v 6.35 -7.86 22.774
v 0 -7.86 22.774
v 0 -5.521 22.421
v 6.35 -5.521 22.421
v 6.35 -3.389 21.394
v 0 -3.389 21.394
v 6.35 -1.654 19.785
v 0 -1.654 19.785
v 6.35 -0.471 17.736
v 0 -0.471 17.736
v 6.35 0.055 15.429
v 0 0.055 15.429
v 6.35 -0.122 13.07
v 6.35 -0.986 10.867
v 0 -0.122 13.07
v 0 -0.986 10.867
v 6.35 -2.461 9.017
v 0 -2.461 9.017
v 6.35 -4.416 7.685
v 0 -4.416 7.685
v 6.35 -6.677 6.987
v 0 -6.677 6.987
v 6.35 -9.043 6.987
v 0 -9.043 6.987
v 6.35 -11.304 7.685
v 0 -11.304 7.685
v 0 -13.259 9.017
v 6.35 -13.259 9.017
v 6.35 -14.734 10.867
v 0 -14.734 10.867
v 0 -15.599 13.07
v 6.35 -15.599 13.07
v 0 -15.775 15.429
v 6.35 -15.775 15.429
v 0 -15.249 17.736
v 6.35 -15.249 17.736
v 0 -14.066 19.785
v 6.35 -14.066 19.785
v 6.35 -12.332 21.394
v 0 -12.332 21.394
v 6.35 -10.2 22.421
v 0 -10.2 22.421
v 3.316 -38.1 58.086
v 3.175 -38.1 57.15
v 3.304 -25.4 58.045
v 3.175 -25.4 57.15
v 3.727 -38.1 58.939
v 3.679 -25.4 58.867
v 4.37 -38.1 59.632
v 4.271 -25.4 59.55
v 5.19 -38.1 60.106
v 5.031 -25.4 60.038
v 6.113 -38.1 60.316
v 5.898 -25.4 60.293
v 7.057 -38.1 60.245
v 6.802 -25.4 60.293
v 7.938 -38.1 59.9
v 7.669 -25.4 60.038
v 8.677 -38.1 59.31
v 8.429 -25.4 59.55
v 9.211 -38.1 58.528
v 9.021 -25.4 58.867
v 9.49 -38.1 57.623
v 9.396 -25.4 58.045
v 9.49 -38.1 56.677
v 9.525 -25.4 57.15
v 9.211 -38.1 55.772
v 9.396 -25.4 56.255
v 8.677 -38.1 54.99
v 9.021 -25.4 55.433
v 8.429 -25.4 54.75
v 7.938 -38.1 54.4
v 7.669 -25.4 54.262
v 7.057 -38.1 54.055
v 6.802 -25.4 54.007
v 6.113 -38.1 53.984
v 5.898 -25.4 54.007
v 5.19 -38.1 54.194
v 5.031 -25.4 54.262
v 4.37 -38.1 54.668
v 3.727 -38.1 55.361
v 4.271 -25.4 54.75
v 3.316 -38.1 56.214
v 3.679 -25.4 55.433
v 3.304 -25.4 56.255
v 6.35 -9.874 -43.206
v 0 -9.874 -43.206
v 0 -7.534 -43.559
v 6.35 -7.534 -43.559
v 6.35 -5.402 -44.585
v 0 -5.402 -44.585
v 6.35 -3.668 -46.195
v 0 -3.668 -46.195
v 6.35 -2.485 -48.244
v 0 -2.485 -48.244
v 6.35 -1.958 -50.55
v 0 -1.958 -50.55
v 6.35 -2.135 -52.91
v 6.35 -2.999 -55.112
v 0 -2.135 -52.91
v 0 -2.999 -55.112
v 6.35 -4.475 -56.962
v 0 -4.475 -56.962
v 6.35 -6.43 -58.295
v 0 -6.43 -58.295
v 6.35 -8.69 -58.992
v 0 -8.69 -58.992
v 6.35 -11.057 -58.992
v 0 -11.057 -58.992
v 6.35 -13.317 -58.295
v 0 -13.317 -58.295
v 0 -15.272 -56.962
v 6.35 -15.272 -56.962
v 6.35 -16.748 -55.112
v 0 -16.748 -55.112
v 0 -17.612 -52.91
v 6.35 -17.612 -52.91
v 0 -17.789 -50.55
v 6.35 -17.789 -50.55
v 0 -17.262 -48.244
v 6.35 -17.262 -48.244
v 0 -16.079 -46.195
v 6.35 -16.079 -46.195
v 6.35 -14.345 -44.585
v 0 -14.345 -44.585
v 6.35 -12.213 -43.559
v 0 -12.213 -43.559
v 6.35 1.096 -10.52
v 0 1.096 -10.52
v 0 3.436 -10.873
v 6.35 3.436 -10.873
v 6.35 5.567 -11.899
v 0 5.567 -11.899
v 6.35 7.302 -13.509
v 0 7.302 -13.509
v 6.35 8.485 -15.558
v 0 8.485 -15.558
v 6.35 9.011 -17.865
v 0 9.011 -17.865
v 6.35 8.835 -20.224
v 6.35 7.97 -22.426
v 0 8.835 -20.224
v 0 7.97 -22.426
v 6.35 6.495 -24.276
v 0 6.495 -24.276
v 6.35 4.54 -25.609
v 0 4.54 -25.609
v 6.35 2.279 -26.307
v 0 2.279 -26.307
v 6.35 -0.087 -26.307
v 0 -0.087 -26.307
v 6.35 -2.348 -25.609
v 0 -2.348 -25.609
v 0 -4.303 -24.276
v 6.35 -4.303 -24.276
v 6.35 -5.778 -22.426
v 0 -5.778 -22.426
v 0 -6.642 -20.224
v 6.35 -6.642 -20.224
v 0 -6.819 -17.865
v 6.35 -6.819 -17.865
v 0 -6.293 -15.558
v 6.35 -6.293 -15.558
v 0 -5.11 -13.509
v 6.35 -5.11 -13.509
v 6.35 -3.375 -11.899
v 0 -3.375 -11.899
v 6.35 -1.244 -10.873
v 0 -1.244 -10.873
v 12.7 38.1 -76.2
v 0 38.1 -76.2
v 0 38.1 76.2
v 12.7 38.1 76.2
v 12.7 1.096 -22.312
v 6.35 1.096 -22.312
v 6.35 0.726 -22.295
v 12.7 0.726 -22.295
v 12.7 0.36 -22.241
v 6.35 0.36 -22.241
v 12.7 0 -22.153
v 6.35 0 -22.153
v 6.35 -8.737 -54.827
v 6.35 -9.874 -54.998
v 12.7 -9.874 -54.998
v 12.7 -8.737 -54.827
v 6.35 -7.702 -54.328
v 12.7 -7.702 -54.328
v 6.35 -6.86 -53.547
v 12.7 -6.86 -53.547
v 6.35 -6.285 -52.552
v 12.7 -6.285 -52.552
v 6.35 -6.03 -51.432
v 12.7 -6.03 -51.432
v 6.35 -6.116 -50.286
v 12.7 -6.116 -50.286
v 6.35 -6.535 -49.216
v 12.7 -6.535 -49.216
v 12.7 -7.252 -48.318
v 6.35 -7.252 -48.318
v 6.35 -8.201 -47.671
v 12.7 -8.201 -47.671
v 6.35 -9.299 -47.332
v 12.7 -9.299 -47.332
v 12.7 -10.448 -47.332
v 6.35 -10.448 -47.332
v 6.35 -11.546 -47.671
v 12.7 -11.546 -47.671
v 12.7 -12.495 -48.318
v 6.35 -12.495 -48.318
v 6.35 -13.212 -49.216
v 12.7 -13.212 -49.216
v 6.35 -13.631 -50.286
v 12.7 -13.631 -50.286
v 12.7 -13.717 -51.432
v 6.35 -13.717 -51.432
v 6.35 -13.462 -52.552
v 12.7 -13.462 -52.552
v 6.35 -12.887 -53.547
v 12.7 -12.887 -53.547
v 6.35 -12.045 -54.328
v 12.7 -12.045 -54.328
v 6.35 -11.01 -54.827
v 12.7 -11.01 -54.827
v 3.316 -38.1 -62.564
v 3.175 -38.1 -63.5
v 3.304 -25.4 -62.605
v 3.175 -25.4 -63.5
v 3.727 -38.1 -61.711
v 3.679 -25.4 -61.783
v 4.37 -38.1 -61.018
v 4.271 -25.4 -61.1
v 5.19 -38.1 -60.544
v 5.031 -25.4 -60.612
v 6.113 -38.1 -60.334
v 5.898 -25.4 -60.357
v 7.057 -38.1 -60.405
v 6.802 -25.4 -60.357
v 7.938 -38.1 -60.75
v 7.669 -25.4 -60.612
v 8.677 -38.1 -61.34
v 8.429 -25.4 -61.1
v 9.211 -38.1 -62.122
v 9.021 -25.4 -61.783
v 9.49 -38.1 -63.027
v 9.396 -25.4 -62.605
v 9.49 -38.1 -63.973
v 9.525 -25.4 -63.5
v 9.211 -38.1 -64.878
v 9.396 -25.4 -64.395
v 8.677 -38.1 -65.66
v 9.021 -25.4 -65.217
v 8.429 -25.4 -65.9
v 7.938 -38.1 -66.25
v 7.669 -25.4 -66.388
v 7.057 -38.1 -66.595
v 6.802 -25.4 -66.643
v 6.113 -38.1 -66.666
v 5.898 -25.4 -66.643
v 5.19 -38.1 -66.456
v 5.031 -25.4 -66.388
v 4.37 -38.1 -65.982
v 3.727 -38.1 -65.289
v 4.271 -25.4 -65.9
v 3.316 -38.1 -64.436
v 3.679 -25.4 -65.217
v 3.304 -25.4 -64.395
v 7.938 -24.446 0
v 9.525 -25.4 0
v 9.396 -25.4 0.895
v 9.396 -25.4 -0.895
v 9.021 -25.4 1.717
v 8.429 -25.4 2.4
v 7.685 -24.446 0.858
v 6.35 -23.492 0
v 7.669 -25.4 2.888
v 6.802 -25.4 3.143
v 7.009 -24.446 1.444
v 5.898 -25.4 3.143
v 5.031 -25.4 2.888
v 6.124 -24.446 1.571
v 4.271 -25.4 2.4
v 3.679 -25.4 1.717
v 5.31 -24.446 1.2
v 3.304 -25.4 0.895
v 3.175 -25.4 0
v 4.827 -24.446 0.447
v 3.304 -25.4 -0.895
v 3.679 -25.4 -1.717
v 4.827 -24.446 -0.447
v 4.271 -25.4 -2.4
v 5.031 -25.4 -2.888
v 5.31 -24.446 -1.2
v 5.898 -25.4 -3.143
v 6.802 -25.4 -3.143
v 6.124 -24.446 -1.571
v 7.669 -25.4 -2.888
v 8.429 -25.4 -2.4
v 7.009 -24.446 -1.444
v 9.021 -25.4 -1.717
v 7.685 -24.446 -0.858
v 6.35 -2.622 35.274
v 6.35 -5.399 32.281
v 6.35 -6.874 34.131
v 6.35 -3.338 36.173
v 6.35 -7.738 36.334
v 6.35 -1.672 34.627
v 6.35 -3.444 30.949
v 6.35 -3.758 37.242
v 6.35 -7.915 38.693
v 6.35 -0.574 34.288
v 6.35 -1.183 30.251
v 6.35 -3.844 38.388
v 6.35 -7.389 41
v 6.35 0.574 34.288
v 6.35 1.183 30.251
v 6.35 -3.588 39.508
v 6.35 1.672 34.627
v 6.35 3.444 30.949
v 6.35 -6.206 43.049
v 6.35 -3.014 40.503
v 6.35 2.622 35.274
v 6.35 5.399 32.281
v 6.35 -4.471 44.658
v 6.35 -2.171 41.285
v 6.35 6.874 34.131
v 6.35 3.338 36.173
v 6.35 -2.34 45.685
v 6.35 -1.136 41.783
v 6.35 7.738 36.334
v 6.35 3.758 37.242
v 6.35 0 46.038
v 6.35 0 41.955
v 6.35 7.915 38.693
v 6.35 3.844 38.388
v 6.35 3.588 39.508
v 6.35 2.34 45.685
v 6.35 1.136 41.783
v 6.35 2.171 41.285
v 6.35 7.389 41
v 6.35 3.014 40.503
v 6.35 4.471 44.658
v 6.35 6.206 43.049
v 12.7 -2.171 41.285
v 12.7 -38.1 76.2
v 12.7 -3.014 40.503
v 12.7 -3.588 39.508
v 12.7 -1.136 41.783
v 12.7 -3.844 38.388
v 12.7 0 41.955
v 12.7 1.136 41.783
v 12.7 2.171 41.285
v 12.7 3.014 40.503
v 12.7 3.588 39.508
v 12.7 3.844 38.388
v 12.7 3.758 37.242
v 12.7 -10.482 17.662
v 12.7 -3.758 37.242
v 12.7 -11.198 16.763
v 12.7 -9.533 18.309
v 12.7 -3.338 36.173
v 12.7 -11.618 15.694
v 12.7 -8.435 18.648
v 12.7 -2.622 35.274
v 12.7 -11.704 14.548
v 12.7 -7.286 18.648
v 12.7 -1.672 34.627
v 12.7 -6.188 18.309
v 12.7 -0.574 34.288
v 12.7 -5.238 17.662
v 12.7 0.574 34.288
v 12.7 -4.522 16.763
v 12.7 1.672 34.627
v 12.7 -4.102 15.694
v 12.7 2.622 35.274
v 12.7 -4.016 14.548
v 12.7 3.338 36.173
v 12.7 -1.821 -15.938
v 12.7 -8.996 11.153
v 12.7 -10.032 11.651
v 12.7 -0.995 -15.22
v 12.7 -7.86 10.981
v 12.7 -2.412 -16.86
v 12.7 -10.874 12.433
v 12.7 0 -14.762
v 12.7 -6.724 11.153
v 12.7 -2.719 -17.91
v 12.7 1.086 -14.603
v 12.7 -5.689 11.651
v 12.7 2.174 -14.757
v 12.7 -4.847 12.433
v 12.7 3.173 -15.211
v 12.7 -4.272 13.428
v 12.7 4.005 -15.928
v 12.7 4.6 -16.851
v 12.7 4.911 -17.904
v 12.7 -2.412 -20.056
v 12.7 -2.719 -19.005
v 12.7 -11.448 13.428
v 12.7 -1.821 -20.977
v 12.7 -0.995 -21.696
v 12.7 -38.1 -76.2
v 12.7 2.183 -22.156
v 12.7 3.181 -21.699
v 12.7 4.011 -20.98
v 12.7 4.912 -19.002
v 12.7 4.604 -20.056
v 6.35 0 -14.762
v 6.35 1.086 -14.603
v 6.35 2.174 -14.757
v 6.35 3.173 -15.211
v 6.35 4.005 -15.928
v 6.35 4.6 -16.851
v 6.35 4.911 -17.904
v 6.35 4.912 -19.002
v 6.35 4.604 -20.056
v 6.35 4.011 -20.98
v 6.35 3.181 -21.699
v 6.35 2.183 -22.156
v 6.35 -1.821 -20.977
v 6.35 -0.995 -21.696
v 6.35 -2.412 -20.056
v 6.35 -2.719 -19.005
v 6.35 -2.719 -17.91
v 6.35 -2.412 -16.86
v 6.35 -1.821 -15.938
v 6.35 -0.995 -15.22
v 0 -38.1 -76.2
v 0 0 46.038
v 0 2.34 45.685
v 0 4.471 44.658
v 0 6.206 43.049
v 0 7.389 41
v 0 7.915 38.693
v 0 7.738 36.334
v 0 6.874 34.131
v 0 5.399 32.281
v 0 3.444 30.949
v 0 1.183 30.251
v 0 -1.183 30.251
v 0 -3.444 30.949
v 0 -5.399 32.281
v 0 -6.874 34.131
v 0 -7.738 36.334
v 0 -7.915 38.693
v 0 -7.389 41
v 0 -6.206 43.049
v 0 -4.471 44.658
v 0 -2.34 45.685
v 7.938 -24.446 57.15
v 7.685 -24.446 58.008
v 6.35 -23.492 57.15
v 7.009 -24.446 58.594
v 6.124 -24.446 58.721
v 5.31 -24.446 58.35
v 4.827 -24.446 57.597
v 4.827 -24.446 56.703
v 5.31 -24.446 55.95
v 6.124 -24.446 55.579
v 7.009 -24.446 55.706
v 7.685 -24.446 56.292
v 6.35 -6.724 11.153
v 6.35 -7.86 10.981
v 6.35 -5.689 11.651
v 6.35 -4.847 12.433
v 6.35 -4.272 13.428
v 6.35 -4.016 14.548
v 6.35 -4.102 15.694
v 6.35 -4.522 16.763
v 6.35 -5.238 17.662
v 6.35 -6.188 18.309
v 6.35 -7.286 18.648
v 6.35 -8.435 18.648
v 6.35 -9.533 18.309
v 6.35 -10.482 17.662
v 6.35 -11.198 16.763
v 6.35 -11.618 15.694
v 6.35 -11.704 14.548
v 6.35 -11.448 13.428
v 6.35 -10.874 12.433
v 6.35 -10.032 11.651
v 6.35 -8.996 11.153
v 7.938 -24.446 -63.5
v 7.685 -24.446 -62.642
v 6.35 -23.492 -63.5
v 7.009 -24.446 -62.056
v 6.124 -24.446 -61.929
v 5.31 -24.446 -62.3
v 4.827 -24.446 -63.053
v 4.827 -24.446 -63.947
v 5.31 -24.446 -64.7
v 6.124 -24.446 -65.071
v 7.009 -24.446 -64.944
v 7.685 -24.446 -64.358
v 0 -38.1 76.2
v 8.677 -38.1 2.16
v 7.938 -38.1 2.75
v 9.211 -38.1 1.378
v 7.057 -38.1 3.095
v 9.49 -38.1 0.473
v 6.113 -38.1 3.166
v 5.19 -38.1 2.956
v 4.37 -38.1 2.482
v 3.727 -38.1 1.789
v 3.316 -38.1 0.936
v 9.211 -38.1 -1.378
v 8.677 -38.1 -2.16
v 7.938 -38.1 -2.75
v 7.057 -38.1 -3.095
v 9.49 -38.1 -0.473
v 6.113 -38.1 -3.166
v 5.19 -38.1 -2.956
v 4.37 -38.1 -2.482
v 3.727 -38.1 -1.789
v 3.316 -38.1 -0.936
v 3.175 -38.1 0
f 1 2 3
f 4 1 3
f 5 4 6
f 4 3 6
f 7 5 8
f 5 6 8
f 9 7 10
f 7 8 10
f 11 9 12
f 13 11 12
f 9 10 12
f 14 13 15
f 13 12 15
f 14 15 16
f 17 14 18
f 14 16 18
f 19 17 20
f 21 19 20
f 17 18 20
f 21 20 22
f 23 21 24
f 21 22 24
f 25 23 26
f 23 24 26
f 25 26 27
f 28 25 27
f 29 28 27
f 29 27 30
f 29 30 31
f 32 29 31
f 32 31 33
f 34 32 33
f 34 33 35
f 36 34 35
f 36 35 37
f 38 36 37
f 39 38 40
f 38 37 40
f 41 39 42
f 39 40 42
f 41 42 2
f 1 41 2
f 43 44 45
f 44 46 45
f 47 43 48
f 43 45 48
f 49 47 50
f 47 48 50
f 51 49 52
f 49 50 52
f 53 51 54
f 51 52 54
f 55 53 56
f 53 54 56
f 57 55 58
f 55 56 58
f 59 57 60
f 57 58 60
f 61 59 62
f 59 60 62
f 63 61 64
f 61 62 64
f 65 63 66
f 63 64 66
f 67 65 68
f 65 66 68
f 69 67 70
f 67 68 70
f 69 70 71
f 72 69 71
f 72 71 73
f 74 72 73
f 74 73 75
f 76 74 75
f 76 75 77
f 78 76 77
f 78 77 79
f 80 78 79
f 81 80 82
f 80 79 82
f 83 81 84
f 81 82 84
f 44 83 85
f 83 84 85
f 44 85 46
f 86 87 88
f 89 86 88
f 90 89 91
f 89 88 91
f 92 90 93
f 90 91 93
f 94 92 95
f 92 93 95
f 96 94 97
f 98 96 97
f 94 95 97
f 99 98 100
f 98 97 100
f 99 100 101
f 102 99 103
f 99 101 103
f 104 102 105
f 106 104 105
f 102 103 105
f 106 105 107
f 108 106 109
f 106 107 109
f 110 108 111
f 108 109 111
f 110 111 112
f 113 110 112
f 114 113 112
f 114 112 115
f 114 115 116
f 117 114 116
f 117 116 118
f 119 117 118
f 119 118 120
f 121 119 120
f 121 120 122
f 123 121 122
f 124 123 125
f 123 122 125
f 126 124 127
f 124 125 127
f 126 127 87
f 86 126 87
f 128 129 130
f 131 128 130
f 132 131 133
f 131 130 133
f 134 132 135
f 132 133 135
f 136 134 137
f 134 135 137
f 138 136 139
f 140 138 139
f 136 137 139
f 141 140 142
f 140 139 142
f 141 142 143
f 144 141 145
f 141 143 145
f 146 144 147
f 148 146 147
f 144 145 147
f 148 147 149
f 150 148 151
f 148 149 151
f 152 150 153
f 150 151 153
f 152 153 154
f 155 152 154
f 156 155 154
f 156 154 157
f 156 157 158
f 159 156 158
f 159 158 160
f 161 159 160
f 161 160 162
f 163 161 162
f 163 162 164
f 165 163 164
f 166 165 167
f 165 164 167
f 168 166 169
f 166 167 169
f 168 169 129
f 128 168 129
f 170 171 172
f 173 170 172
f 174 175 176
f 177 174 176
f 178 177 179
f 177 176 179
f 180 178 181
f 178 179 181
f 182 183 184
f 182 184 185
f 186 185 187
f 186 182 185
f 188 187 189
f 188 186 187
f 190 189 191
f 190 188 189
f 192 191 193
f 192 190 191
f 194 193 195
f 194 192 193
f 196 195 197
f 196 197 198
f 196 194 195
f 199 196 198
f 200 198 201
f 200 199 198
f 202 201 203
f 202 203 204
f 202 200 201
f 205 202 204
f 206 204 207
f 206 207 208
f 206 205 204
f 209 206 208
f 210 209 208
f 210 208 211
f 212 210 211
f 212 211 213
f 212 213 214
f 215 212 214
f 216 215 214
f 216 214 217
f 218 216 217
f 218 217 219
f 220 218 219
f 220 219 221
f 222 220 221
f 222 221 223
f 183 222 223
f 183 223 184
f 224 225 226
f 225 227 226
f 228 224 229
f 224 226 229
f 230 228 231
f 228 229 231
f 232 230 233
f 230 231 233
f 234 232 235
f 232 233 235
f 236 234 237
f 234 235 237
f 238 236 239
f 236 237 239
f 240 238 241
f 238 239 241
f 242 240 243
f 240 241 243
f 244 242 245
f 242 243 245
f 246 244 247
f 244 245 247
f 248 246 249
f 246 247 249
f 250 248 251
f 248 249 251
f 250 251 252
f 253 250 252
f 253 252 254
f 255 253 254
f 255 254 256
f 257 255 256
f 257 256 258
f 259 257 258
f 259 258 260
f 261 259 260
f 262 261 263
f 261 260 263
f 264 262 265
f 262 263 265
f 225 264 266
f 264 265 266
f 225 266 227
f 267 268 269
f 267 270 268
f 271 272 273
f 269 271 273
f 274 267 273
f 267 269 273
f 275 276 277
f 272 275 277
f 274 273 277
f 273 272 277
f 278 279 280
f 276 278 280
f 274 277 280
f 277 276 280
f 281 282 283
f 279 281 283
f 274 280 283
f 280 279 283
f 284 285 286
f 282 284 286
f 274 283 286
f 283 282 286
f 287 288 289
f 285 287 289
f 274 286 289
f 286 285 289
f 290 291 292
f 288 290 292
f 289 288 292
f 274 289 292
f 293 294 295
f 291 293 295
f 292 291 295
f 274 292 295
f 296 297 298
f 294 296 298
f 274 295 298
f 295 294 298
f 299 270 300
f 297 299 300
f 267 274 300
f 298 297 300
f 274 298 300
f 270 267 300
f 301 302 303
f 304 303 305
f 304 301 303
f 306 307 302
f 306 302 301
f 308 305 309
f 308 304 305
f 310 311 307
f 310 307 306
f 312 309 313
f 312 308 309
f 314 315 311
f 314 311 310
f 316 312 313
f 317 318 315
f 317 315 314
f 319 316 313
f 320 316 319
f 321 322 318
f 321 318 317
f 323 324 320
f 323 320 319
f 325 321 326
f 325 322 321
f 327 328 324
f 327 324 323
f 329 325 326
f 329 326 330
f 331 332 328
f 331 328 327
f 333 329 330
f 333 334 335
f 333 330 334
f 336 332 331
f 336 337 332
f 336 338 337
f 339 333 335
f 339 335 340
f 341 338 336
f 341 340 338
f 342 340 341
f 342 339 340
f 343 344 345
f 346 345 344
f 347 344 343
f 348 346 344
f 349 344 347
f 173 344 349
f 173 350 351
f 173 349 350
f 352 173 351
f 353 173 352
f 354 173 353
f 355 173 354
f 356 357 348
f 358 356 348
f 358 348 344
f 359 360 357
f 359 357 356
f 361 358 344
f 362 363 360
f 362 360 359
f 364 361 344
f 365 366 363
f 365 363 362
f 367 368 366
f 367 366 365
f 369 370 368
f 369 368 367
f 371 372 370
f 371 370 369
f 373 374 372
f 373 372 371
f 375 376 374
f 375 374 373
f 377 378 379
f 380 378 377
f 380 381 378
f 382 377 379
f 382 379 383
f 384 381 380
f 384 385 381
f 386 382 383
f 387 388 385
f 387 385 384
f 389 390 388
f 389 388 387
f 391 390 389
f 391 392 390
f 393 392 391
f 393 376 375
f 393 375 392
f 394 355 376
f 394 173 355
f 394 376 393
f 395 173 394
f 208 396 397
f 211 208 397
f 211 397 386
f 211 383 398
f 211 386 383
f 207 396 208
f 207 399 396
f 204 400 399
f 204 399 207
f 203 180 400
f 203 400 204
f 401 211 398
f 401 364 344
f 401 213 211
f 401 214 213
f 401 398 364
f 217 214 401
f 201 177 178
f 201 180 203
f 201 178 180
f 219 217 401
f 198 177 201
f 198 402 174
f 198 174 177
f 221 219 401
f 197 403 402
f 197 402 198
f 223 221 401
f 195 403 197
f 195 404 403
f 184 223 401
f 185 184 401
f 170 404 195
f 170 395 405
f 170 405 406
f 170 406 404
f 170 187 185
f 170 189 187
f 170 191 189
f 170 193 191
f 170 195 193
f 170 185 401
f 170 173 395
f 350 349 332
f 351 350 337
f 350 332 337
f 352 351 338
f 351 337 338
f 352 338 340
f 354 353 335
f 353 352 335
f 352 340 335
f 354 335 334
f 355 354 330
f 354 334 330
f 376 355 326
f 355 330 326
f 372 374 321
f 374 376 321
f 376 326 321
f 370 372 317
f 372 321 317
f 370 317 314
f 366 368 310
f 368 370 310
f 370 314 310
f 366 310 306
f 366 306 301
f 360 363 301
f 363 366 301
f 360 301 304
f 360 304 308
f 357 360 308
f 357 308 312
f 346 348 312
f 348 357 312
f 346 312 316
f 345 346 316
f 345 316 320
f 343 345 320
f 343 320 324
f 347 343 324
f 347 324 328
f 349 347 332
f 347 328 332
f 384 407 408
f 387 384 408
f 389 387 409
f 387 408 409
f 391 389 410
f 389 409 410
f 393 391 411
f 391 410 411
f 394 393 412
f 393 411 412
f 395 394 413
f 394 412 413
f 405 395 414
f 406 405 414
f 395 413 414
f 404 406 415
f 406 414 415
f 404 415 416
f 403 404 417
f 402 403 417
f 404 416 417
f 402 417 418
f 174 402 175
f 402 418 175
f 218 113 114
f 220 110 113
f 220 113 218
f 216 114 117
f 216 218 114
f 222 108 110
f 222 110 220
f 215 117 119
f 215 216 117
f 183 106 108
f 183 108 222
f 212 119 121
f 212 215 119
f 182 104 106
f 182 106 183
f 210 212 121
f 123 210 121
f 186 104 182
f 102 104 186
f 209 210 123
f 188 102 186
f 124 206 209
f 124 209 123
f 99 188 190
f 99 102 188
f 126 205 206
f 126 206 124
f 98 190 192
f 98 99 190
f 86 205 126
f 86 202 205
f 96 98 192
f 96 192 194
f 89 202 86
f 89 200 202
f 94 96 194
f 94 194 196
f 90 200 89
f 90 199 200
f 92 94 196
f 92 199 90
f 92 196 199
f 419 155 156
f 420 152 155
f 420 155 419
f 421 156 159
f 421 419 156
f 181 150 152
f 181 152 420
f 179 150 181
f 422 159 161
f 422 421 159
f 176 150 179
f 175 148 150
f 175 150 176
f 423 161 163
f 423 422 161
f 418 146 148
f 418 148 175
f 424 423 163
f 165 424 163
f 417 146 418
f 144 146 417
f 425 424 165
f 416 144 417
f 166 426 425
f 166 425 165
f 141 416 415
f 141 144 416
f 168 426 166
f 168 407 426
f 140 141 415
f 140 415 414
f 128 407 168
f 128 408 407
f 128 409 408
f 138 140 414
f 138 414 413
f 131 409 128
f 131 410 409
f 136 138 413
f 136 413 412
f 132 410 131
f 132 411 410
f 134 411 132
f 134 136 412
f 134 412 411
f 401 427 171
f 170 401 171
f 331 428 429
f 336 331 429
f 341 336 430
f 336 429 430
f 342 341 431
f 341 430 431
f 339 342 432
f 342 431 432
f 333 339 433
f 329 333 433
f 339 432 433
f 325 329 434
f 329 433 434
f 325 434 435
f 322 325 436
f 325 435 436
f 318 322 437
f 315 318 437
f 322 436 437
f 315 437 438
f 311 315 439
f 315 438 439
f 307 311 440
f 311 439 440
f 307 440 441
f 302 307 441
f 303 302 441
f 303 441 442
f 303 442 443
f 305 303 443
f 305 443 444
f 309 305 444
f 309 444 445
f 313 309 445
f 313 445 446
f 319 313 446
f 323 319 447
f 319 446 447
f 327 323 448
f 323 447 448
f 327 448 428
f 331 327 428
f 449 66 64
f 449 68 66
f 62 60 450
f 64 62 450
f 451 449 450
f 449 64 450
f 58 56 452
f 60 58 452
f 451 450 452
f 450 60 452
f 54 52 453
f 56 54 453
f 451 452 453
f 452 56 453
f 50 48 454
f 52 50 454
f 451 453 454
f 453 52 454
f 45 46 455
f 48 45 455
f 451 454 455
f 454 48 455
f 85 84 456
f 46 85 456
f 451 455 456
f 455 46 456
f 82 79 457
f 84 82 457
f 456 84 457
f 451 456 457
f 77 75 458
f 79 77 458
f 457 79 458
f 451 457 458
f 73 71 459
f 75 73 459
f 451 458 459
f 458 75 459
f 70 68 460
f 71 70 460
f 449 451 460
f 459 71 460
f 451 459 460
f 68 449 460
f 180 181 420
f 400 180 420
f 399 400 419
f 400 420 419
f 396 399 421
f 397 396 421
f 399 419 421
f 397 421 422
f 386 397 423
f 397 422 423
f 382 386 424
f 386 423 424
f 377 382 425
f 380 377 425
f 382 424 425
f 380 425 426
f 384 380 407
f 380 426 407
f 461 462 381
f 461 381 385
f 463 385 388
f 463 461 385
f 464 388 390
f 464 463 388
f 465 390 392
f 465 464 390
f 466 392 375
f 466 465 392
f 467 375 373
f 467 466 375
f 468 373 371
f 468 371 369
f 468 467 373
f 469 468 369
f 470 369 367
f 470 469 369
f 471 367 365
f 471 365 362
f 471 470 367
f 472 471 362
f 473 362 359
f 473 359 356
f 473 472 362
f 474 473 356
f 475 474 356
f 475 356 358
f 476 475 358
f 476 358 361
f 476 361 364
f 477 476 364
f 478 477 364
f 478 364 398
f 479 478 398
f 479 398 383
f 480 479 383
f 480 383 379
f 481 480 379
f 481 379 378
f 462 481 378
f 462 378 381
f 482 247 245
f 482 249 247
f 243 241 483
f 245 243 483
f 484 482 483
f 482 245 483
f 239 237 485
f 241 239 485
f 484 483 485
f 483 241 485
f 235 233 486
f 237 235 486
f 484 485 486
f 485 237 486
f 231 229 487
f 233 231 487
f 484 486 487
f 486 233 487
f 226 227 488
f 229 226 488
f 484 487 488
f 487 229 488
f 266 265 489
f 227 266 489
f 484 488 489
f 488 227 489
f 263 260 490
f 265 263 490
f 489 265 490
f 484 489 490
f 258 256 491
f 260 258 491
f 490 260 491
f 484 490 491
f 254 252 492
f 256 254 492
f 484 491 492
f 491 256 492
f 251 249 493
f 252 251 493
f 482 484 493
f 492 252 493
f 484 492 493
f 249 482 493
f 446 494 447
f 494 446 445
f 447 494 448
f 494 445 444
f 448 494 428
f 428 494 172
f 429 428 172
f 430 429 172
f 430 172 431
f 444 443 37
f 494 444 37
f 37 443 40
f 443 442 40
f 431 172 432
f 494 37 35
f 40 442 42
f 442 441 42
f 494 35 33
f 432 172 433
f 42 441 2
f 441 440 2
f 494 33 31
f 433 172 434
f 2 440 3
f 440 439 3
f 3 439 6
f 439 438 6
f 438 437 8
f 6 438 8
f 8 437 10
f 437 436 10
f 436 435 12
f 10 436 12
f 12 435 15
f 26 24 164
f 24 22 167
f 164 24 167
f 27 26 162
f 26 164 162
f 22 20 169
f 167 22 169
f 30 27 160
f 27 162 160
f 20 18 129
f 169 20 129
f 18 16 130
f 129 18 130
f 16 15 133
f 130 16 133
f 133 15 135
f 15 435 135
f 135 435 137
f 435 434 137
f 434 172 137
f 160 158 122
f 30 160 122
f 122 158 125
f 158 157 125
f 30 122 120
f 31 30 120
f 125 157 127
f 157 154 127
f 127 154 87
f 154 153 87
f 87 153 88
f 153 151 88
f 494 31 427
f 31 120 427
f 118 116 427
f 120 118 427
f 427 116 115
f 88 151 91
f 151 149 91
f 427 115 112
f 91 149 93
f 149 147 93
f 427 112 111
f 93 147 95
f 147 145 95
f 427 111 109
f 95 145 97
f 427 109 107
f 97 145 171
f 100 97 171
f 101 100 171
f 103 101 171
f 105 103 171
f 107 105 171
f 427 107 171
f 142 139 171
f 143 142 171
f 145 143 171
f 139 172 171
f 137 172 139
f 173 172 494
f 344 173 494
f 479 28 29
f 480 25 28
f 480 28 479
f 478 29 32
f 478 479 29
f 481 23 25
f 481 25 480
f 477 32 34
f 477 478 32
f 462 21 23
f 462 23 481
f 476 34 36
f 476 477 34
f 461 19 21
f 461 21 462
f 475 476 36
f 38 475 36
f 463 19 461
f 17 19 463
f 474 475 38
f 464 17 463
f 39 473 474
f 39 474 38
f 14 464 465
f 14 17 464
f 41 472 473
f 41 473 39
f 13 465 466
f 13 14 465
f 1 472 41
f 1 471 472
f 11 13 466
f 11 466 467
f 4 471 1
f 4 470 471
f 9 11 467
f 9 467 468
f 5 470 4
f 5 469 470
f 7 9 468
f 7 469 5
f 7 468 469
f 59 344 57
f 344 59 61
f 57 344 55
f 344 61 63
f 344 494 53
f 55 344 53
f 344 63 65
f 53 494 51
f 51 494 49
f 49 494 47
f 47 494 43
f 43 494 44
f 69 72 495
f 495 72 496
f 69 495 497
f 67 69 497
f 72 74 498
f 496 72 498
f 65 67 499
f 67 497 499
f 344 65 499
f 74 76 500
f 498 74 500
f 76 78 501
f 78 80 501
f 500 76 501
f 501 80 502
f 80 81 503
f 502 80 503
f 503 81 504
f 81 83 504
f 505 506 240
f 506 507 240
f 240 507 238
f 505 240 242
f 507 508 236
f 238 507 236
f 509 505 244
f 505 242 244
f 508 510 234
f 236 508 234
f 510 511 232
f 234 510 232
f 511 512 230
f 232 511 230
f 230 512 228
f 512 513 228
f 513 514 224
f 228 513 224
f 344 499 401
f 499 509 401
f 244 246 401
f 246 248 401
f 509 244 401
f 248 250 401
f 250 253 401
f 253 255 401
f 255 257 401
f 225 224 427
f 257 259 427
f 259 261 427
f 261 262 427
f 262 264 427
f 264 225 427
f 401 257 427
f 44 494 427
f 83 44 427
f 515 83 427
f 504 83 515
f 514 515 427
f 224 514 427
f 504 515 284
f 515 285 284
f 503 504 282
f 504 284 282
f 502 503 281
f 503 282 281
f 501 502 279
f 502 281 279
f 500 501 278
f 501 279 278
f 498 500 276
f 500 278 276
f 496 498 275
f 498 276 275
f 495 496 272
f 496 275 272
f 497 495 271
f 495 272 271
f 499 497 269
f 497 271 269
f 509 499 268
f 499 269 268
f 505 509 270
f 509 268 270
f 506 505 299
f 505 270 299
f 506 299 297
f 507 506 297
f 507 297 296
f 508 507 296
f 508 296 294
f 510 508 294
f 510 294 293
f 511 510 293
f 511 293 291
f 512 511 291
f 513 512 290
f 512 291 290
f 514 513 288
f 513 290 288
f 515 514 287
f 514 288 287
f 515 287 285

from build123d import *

# Parameters (mm, degrees)
SKETCH1_W                       = 152.4
SKETCH1_H                       = 76.2
SKETCH1_R                       = 3.854557775
BOSS_EXTRUDE1_DEPTH             = 12.7
F_1_4_0_25_DIAMETER_HOLE2_D     = 6.35
F_1_4_0_25_DIAMETER_HOLE2_DEPTH = 12.7
F_1_4_0_25_DIAMETER_HOLE2_TIP   = 1.907732465
SKETCH2_R                       = 7.9375
CUT_EXTRUDE1_DEPTH              = 6.35


with BuildPart() as part:
    # Sketch1 → Boss-Extrude1 (new body)
    with BuildSketch(Plane(origin=(0, 0, 0), x_dir=(0, 0, -1), z_dir=(1, 0, 0))):
        Rectangle(SKETCH1_W, SKETCH1_H)
        with Locations((18.457733582, 1.096077429)):
            Circle(SKETCH1_R, mode=Mode.SUBTRACT)
        with Locations((-38.1, 0)):
            Circle(SKETCH1_R, mode=Mode.SUBTRACT)
        with Locations((-14.836022013, -7.860160654)):
            Circle(SKETCH1_R, mode=Mode.SUBTRACT)
        with Locations((51.143457994, -9.873506971)):
            Circle(SKETCH1_R, mode=Mode.SUBTRACT)
    extrude(amount=BOSS_EXTRUDE1_DEPTH)

    # 1/4 (0.25) Diameter Hole2
    with Locations(Plane.XZ.offset(38.1)):
        with Locations((6.35, 57.15), (6.35, -63.5), (6.35, 0)):
            Hole(F_1_4_0_25_DIAMETER_HOLE2_D / 2, depth=F_1_4_0_25_DIAMETER_HOLE2_DEPTH)
            with Locations((0, 0, -(F_1_4_0_25_DIAMETER_HOLE2_DEPTH + F_1_4_0_25_DIAMETER_HOLE2_TIP / 2))):  # 118° drill point
                Cone(0, F_1_4_0_25_DIAMETER_HOLE2_D / 2, F_1_4_0_25_DIAMETER_HOLE2_TIP, mode=Mode.SUBTRACT)

    # Sketch2 → Cut-Extrude1 (cut)
    with BuildSketch(Plane.ZY):
        with Locations((38.1, 0)):
            Circle(SKETCH2_R)
        with Locations((14.836022013, -7.860160654)):
            Circle(SKETCH2_R)
        with Locations((-18.457733582, 1.096077429)):
            Circle(SKETCH2_R)
        with Locations((-51.143457994, -9.873506971)):
            Circle(SKETCH2_R)
    extrude(amount=-CUT_EXTRUDE1_DEPTH, mode=Mode.SUBTRACT)


solid = part.part
